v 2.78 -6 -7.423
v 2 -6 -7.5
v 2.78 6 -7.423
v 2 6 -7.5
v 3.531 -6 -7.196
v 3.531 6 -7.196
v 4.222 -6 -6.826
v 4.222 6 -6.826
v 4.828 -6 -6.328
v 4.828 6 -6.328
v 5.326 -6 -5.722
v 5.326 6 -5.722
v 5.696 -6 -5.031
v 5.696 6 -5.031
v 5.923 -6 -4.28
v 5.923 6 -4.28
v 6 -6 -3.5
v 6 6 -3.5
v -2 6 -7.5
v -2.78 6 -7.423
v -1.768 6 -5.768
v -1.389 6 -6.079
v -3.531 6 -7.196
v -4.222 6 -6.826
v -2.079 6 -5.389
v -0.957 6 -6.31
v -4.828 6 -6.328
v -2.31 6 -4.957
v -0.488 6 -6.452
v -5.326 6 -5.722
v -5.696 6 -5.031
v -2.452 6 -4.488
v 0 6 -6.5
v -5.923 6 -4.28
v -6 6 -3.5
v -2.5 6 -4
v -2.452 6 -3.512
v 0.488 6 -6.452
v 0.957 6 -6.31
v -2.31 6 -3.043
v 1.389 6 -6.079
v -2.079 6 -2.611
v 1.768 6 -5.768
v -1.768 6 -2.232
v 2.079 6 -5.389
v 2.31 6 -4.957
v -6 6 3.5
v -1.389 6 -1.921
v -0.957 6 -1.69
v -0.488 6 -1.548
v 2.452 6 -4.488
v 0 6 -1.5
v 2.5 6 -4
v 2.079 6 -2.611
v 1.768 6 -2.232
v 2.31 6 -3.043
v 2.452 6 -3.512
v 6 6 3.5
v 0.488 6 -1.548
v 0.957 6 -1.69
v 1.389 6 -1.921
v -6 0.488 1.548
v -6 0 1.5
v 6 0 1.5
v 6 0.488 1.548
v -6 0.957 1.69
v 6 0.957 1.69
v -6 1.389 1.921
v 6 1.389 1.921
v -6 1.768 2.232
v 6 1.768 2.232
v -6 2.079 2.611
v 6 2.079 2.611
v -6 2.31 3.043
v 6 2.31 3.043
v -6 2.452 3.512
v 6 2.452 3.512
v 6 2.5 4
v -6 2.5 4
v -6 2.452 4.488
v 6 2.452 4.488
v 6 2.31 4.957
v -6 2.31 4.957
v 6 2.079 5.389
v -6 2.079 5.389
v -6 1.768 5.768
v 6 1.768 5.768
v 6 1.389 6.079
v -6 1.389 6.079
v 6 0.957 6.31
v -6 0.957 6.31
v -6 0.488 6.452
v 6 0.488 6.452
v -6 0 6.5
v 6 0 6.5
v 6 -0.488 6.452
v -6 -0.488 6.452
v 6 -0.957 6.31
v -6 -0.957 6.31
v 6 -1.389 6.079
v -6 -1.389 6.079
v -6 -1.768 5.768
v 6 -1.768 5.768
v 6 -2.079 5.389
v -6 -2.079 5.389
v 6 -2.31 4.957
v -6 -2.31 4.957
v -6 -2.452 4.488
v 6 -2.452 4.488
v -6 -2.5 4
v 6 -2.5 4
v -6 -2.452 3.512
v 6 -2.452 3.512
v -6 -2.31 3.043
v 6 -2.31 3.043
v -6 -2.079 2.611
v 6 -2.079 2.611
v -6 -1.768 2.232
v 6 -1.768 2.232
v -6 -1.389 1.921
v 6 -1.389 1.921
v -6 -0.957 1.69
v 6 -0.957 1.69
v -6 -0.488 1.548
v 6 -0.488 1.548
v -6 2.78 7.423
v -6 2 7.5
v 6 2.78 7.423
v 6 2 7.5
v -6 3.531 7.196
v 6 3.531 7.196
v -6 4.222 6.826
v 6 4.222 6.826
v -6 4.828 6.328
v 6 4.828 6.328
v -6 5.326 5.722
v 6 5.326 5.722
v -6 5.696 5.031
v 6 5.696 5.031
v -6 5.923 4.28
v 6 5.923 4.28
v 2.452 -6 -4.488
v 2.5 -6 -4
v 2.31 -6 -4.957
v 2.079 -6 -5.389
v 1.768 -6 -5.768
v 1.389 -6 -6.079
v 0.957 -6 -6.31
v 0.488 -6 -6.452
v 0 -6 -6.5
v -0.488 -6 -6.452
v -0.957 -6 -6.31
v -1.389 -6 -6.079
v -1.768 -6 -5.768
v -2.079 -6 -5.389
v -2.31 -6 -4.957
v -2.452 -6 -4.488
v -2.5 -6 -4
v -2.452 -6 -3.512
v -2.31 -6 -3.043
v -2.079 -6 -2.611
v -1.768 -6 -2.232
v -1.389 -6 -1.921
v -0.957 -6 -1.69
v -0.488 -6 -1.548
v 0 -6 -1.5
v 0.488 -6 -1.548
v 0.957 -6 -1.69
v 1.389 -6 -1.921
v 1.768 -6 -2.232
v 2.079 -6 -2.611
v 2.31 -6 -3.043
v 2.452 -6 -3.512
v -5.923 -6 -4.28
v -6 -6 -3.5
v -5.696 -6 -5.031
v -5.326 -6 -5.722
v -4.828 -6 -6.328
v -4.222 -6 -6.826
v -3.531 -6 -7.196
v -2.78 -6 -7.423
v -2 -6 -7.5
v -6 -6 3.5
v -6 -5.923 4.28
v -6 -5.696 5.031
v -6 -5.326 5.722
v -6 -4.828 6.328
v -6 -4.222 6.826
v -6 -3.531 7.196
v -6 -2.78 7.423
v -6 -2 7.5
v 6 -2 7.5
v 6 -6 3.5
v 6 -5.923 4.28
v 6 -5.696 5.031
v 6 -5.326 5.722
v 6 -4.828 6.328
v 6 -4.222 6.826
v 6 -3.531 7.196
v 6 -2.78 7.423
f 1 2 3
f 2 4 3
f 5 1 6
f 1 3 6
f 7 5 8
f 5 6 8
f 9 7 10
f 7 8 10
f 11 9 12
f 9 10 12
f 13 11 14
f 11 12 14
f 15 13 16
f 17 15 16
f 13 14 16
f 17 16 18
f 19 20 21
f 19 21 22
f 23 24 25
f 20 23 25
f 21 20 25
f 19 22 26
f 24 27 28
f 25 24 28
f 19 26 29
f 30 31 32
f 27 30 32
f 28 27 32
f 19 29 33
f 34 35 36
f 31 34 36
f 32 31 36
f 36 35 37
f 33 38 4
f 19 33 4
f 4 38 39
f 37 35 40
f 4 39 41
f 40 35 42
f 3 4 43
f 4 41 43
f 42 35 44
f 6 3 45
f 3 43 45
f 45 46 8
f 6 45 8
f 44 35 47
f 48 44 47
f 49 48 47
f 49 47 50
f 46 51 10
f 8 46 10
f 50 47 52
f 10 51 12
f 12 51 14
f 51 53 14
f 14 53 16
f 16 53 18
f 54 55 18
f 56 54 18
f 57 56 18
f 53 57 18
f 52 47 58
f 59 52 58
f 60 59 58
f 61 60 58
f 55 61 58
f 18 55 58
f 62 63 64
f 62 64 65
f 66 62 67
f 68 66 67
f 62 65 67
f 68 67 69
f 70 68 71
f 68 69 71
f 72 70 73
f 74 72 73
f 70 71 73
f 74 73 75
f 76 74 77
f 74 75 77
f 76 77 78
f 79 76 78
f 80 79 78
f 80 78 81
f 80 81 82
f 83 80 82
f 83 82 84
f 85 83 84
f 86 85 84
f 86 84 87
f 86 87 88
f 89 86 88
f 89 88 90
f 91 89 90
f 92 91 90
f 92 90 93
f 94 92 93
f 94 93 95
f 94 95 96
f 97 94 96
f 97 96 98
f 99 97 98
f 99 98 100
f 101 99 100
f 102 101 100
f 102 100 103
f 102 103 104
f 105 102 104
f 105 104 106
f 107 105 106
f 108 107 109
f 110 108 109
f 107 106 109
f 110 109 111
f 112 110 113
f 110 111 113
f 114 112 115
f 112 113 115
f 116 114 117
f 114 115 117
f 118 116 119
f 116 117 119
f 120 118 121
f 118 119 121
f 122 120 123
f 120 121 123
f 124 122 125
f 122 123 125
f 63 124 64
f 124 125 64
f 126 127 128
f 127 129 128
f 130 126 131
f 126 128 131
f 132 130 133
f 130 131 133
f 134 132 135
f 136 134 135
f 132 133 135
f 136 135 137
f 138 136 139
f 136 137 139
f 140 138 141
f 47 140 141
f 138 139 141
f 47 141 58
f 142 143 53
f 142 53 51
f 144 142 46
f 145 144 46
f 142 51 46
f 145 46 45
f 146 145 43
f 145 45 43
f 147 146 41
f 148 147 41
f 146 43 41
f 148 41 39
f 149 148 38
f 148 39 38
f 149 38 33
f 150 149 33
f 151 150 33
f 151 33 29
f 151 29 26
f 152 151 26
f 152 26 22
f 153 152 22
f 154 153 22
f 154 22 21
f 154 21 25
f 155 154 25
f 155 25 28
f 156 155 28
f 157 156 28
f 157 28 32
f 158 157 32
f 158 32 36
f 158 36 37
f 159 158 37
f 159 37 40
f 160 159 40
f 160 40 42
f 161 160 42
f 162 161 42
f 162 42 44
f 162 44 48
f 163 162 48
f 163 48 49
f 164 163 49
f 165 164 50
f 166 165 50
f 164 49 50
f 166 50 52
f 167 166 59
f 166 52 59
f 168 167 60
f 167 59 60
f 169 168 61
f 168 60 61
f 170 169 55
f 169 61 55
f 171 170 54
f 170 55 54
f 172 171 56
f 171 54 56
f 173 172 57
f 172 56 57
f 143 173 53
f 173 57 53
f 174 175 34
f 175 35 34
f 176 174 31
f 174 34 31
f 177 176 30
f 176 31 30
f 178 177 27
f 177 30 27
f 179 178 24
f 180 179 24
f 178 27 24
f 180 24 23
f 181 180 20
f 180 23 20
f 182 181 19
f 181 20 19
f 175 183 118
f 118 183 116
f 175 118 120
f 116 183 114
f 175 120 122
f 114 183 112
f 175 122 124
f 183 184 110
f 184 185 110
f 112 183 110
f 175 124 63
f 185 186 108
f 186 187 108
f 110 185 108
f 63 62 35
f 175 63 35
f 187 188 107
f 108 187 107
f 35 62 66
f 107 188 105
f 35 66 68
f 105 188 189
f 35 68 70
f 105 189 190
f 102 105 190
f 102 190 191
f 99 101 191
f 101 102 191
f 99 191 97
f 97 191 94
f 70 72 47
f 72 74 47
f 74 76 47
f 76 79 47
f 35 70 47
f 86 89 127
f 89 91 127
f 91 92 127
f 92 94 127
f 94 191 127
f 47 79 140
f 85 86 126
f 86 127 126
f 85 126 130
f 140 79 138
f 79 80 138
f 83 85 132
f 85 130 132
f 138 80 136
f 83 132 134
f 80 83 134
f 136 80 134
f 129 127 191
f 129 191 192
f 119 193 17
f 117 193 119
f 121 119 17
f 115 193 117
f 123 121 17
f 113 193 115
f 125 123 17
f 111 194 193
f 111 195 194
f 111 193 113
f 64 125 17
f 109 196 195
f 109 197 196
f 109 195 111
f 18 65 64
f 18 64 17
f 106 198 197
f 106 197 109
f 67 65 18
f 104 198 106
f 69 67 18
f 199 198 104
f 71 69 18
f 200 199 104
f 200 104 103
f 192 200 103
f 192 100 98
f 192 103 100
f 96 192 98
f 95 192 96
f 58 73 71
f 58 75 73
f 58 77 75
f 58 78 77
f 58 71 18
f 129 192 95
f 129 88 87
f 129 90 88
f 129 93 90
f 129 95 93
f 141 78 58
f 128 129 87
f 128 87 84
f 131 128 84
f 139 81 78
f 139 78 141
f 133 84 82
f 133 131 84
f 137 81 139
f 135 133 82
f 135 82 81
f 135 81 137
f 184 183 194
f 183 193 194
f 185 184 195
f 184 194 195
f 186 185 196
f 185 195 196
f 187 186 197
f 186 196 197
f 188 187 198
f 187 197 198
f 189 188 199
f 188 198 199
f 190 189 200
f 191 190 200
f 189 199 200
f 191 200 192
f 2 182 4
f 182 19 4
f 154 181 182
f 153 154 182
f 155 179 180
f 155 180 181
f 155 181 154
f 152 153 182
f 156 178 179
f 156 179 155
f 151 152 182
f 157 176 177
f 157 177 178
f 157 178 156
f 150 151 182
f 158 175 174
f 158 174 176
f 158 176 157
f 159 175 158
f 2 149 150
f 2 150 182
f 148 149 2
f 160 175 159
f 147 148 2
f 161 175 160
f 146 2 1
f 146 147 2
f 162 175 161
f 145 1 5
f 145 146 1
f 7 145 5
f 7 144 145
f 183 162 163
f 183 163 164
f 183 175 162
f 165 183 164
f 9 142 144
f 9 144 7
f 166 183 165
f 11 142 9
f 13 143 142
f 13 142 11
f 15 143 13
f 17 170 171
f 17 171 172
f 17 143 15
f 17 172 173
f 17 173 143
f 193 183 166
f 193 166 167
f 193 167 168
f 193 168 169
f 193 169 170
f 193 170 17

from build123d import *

# Parameters (mm, degrees)
SKETCH1_W          = 12
SKETCH1_H          = 12
EXTRUDE1_DEPTH     = 7.5
SKETCH2_R          = 2.5
CUT_EXTRUDE1_DEPTH = 13
SKETCH3_R          = 2.5
CUT_EXTRUDE2_DEPTH = 13
FILLET1_R          = 4


with BuildPart() as part:
    # Sketch1 → Extrude1 (new body, symmetric)
    with BuildSketch(Plane.XY):
        Rectangle(SKETCH1_W, SKETCH1_H)
    extrude(amount=EXTRUDE1_DEPTH, both=True)

    # Sketch2 → Cut-Extrude1 (cut, through all)
    with BuildSketch(Plane(origin=(0, 6, 0), x_dir=(1, 0, 0), z_dir=(0, 1, 0))):
        with Locations((0, 4)):
            Circle(SKETCH2_R)
    extrude(amount=-CUT_EXTRUDE1_DEPTH, mode=Mode.SUBTRACT)

    # Sketch3 → Cut-Extrude2 (cut, through all)
    with BuildSketch(Plane(origin=(6, 0, 0), x_dir=(0, 0, -1), z_dir=(1, 0, 0))):
        with Locations((-4, 0)):
            Circle(SKETCH3_R)
    extrude(amount=-CUT_EXTRUDE2_DEPTH, mode=Mode.SUBTRACT)

    # Fillet1
    fillet1_edges = [part.edges().sort_by_distance(p)[0] for p in [
        (0, 6, 7.5),
        (6, 0, -7.5),
        (-6, 0, -7.5),
        (0, -6, 7.5),
    ]]
    fillet(fillet1_edges, radius=FILLET1_R)


solid = part.part
